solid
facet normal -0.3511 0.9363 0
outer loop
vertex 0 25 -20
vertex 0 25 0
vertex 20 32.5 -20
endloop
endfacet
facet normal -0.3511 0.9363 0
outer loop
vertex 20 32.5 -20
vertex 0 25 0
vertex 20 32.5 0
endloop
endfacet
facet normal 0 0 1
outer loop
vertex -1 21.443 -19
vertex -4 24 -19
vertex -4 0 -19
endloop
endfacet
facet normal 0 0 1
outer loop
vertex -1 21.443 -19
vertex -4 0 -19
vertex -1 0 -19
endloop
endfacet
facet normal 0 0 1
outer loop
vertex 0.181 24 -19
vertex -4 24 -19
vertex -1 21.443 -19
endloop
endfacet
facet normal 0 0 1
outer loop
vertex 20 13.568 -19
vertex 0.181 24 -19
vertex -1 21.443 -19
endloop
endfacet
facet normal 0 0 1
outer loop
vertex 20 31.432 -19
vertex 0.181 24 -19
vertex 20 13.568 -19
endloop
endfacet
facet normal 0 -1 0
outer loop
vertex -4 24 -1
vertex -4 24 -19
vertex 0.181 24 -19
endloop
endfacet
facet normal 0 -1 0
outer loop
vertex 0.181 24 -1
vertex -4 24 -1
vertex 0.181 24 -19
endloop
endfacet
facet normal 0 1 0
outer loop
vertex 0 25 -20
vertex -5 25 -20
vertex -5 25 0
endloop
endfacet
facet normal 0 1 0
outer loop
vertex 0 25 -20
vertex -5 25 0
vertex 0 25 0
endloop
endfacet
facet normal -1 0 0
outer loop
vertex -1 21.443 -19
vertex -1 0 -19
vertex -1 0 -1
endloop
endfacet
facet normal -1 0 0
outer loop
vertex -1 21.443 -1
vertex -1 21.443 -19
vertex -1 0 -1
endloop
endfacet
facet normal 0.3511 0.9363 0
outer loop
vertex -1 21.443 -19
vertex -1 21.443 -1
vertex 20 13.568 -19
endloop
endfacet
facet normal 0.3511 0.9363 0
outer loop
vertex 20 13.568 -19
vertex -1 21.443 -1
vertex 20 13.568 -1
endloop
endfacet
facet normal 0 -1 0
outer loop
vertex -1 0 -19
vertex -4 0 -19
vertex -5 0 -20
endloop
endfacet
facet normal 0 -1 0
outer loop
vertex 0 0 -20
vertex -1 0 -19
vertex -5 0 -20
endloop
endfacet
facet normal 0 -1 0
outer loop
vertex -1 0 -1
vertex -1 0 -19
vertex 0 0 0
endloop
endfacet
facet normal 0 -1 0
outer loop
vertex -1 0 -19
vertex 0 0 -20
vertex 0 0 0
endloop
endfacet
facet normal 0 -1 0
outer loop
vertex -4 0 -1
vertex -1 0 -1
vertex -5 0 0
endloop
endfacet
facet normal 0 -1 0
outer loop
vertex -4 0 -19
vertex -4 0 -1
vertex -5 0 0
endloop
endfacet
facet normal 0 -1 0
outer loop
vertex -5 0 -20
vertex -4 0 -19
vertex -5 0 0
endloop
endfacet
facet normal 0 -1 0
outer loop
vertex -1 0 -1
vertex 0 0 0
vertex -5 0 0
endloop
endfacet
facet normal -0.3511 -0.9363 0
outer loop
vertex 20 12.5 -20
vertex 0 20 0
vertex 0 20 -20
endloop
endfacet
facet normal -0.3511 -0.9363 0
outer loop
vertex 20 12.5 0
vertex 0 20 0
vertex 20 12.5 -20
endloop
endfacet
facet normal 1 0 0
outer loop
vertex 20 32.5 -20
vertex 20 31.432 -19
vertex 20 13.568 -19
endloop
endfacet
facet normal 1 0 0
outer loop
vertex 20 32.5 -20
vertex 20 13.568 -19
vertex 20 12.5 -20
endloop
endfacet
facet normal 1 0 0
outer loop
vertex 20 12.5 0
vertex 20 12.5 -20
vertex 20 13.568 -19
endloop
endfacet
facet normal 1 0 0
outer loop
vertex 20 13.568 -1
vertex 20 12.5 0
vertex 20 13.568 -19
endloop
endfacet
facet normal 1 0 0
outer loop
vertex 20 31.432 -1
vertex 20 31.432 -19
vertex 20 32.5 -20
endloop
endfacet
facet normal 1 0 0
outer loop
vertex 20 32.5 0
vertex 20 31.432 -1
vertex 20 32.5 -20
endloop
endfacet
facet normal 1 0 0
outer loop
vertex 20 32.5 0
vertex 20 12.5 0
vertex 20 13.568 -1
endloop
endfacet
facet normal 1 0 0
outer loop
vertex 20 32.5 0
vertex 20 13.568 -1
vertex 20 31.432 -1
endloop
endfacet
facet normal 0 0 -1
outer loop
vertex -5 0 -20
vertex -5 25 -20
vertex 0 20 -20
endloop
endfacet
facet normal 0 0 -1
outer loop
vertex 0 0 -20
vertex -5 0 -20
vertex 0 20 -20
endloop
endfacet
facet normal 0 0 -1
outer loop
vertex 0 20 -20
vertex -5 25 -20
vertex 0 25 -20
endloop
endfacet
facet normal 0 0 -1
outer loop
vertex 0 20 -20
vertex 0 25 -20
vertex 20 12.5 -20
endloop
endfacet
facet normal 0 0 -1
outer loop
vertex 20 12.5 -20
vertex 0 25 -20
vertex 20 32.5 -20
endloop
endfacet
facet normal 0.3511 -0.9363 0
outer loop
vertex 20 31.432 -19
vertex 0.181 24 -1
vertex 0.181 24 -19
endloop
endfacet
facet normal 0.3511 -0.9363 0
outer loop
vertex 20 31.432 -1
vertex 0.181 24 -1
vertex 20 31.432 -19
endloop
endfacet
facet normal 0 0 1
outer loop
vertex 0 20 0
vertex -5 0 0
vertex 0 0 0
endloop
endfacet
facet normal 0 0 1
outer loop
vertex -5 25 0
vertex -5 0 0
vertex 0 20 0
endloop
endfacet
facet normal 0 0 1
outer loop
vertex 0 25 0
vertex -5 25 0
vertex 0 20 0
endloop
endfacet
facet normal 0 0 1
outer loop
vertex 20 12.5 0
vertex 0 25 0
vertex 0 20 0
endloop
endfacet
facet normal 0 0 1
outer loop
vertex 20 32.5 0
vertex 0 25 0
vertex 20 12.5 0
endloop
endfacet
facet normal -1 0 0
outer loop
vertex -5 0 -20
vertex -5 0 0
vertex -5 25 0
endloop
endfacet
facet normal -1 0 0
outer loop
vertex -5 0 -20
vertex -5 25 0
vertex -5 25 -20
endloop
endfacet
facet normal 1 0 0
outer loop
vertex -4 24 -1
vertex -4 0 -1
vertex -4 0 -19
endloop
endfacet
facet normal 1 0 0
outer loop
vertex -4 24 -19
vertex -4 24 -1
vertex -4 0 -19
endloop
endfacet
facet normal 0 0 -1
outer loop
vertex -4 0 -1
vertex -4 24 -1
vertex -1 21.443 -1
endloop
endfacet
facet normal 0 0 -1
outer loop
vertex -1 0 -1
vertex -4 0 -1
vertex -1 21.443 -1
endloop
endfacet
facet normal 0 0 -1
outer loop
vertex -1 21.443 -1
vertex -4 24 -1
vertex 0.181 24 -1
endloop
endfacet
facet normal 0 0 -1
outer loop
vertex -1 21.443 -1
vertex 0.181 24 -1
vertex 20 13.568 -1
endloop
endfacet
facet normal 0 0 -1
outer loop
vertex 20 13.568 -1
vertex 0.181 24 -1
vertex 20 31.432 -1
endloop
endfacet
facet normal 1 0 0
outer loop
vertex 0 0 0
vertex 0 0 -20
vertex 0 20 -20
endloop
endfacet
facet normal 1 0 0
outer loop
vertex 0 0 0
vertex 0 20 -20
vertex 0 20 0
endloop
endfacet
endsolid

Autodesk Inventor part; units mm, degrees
ref_plane "YZ Plane" through (0, 0, 0) normal (1, 0, 0) x (0, 1, 0)
ref_plane "XZ Plane" through (0, 0, 0) normal (0, 1, 0) x (-1, 0, 0)
ref_plane "XY Plane" through (0, 0, 0) normal (0, 0, 1) x (1, 0, 0)
sketch "草圖1" plane through (0, 0, 0) normal (0, 1, 0) x (-1, 0, 0)
  line L0 (0, 0) -> (5, 0)
  line L1 (5, 0) -> (5, -20)
  line L2 (5, -20) -> (0, -20)
  line L3 (0, -20) -> (0, 0)
  dimension "d0" = 5
  dimension "d1" = 20
extrude "擠出1" add sketch "草圖1" along normal blind 20
sketch "草圖3" plane through (0, 20, 0) normal (0, 1, 0) x (1, 0, 0)
  line L0 (0, 20) -> (-5, 20) projected
  line L1 (0, 0) -> (-5, 0)
  line L2 (-5, 0) -> (-5, 20)
  line L3 (-5, 20) -> (0, 20)
  line L4 (0, 20) -> (0, 0)
extrude "擠出3" add sketch "草圖3" along normal blind 5
sketch "草圖4" plane through (-5, 0, 0) normal (0, 0, 1) x (1, 0, 0)
  line L0 (5, 0) -> (5, 25) projected
  line L1 (0, 25) -> (5, 25) projected
  line L2 (5, 25) -> (0, 25) projected
  line L3 (5, 25) -> (25, 32.5)
  line L4 (5, 20) -> (25, 12.5)
  line L5 (25, 12.5) -> (25, 32.5)
  line L6 (0, 0) -> (5, 0) projected
  line L7 (0, 0) -> (0, 25) projected
  line L8 (-5.1212, 0) -> (30.7273, 0) projected
  dimension "d8" = 5
  dimension "d9" = 20
  dimension "d19" = 20
extrude "擠出4" add sketch "草圖4" against normal up to surface (20 mm away) contours L0 L3 L5 L4
shell "薄殼2" thickness 1 removed faces 2 at (20, 19.1667, -6.6667) at (-1.6667, 0, -6.6667)
equation "\"d0\" = bottom_w"
equation "\"d1\" = bottom_l"
equation "\"d2\" = bottom_h"
equation "\"d6\" = nuzzle_lh"
equation "\"d8\" = nuzzle_lh"
equation "\"d9\" = 4 * nuzzle_lh"
equation "\"d15\" = nuzzle_lh"
equation "\"bottom_w\" = 5"
equation "\"bottom_l\" = 20"
equation "\"bottom_h\" = 20"
equation "\"nuzzle_lh\" = 5"
properties part number "nuzzle_v1_0310"
